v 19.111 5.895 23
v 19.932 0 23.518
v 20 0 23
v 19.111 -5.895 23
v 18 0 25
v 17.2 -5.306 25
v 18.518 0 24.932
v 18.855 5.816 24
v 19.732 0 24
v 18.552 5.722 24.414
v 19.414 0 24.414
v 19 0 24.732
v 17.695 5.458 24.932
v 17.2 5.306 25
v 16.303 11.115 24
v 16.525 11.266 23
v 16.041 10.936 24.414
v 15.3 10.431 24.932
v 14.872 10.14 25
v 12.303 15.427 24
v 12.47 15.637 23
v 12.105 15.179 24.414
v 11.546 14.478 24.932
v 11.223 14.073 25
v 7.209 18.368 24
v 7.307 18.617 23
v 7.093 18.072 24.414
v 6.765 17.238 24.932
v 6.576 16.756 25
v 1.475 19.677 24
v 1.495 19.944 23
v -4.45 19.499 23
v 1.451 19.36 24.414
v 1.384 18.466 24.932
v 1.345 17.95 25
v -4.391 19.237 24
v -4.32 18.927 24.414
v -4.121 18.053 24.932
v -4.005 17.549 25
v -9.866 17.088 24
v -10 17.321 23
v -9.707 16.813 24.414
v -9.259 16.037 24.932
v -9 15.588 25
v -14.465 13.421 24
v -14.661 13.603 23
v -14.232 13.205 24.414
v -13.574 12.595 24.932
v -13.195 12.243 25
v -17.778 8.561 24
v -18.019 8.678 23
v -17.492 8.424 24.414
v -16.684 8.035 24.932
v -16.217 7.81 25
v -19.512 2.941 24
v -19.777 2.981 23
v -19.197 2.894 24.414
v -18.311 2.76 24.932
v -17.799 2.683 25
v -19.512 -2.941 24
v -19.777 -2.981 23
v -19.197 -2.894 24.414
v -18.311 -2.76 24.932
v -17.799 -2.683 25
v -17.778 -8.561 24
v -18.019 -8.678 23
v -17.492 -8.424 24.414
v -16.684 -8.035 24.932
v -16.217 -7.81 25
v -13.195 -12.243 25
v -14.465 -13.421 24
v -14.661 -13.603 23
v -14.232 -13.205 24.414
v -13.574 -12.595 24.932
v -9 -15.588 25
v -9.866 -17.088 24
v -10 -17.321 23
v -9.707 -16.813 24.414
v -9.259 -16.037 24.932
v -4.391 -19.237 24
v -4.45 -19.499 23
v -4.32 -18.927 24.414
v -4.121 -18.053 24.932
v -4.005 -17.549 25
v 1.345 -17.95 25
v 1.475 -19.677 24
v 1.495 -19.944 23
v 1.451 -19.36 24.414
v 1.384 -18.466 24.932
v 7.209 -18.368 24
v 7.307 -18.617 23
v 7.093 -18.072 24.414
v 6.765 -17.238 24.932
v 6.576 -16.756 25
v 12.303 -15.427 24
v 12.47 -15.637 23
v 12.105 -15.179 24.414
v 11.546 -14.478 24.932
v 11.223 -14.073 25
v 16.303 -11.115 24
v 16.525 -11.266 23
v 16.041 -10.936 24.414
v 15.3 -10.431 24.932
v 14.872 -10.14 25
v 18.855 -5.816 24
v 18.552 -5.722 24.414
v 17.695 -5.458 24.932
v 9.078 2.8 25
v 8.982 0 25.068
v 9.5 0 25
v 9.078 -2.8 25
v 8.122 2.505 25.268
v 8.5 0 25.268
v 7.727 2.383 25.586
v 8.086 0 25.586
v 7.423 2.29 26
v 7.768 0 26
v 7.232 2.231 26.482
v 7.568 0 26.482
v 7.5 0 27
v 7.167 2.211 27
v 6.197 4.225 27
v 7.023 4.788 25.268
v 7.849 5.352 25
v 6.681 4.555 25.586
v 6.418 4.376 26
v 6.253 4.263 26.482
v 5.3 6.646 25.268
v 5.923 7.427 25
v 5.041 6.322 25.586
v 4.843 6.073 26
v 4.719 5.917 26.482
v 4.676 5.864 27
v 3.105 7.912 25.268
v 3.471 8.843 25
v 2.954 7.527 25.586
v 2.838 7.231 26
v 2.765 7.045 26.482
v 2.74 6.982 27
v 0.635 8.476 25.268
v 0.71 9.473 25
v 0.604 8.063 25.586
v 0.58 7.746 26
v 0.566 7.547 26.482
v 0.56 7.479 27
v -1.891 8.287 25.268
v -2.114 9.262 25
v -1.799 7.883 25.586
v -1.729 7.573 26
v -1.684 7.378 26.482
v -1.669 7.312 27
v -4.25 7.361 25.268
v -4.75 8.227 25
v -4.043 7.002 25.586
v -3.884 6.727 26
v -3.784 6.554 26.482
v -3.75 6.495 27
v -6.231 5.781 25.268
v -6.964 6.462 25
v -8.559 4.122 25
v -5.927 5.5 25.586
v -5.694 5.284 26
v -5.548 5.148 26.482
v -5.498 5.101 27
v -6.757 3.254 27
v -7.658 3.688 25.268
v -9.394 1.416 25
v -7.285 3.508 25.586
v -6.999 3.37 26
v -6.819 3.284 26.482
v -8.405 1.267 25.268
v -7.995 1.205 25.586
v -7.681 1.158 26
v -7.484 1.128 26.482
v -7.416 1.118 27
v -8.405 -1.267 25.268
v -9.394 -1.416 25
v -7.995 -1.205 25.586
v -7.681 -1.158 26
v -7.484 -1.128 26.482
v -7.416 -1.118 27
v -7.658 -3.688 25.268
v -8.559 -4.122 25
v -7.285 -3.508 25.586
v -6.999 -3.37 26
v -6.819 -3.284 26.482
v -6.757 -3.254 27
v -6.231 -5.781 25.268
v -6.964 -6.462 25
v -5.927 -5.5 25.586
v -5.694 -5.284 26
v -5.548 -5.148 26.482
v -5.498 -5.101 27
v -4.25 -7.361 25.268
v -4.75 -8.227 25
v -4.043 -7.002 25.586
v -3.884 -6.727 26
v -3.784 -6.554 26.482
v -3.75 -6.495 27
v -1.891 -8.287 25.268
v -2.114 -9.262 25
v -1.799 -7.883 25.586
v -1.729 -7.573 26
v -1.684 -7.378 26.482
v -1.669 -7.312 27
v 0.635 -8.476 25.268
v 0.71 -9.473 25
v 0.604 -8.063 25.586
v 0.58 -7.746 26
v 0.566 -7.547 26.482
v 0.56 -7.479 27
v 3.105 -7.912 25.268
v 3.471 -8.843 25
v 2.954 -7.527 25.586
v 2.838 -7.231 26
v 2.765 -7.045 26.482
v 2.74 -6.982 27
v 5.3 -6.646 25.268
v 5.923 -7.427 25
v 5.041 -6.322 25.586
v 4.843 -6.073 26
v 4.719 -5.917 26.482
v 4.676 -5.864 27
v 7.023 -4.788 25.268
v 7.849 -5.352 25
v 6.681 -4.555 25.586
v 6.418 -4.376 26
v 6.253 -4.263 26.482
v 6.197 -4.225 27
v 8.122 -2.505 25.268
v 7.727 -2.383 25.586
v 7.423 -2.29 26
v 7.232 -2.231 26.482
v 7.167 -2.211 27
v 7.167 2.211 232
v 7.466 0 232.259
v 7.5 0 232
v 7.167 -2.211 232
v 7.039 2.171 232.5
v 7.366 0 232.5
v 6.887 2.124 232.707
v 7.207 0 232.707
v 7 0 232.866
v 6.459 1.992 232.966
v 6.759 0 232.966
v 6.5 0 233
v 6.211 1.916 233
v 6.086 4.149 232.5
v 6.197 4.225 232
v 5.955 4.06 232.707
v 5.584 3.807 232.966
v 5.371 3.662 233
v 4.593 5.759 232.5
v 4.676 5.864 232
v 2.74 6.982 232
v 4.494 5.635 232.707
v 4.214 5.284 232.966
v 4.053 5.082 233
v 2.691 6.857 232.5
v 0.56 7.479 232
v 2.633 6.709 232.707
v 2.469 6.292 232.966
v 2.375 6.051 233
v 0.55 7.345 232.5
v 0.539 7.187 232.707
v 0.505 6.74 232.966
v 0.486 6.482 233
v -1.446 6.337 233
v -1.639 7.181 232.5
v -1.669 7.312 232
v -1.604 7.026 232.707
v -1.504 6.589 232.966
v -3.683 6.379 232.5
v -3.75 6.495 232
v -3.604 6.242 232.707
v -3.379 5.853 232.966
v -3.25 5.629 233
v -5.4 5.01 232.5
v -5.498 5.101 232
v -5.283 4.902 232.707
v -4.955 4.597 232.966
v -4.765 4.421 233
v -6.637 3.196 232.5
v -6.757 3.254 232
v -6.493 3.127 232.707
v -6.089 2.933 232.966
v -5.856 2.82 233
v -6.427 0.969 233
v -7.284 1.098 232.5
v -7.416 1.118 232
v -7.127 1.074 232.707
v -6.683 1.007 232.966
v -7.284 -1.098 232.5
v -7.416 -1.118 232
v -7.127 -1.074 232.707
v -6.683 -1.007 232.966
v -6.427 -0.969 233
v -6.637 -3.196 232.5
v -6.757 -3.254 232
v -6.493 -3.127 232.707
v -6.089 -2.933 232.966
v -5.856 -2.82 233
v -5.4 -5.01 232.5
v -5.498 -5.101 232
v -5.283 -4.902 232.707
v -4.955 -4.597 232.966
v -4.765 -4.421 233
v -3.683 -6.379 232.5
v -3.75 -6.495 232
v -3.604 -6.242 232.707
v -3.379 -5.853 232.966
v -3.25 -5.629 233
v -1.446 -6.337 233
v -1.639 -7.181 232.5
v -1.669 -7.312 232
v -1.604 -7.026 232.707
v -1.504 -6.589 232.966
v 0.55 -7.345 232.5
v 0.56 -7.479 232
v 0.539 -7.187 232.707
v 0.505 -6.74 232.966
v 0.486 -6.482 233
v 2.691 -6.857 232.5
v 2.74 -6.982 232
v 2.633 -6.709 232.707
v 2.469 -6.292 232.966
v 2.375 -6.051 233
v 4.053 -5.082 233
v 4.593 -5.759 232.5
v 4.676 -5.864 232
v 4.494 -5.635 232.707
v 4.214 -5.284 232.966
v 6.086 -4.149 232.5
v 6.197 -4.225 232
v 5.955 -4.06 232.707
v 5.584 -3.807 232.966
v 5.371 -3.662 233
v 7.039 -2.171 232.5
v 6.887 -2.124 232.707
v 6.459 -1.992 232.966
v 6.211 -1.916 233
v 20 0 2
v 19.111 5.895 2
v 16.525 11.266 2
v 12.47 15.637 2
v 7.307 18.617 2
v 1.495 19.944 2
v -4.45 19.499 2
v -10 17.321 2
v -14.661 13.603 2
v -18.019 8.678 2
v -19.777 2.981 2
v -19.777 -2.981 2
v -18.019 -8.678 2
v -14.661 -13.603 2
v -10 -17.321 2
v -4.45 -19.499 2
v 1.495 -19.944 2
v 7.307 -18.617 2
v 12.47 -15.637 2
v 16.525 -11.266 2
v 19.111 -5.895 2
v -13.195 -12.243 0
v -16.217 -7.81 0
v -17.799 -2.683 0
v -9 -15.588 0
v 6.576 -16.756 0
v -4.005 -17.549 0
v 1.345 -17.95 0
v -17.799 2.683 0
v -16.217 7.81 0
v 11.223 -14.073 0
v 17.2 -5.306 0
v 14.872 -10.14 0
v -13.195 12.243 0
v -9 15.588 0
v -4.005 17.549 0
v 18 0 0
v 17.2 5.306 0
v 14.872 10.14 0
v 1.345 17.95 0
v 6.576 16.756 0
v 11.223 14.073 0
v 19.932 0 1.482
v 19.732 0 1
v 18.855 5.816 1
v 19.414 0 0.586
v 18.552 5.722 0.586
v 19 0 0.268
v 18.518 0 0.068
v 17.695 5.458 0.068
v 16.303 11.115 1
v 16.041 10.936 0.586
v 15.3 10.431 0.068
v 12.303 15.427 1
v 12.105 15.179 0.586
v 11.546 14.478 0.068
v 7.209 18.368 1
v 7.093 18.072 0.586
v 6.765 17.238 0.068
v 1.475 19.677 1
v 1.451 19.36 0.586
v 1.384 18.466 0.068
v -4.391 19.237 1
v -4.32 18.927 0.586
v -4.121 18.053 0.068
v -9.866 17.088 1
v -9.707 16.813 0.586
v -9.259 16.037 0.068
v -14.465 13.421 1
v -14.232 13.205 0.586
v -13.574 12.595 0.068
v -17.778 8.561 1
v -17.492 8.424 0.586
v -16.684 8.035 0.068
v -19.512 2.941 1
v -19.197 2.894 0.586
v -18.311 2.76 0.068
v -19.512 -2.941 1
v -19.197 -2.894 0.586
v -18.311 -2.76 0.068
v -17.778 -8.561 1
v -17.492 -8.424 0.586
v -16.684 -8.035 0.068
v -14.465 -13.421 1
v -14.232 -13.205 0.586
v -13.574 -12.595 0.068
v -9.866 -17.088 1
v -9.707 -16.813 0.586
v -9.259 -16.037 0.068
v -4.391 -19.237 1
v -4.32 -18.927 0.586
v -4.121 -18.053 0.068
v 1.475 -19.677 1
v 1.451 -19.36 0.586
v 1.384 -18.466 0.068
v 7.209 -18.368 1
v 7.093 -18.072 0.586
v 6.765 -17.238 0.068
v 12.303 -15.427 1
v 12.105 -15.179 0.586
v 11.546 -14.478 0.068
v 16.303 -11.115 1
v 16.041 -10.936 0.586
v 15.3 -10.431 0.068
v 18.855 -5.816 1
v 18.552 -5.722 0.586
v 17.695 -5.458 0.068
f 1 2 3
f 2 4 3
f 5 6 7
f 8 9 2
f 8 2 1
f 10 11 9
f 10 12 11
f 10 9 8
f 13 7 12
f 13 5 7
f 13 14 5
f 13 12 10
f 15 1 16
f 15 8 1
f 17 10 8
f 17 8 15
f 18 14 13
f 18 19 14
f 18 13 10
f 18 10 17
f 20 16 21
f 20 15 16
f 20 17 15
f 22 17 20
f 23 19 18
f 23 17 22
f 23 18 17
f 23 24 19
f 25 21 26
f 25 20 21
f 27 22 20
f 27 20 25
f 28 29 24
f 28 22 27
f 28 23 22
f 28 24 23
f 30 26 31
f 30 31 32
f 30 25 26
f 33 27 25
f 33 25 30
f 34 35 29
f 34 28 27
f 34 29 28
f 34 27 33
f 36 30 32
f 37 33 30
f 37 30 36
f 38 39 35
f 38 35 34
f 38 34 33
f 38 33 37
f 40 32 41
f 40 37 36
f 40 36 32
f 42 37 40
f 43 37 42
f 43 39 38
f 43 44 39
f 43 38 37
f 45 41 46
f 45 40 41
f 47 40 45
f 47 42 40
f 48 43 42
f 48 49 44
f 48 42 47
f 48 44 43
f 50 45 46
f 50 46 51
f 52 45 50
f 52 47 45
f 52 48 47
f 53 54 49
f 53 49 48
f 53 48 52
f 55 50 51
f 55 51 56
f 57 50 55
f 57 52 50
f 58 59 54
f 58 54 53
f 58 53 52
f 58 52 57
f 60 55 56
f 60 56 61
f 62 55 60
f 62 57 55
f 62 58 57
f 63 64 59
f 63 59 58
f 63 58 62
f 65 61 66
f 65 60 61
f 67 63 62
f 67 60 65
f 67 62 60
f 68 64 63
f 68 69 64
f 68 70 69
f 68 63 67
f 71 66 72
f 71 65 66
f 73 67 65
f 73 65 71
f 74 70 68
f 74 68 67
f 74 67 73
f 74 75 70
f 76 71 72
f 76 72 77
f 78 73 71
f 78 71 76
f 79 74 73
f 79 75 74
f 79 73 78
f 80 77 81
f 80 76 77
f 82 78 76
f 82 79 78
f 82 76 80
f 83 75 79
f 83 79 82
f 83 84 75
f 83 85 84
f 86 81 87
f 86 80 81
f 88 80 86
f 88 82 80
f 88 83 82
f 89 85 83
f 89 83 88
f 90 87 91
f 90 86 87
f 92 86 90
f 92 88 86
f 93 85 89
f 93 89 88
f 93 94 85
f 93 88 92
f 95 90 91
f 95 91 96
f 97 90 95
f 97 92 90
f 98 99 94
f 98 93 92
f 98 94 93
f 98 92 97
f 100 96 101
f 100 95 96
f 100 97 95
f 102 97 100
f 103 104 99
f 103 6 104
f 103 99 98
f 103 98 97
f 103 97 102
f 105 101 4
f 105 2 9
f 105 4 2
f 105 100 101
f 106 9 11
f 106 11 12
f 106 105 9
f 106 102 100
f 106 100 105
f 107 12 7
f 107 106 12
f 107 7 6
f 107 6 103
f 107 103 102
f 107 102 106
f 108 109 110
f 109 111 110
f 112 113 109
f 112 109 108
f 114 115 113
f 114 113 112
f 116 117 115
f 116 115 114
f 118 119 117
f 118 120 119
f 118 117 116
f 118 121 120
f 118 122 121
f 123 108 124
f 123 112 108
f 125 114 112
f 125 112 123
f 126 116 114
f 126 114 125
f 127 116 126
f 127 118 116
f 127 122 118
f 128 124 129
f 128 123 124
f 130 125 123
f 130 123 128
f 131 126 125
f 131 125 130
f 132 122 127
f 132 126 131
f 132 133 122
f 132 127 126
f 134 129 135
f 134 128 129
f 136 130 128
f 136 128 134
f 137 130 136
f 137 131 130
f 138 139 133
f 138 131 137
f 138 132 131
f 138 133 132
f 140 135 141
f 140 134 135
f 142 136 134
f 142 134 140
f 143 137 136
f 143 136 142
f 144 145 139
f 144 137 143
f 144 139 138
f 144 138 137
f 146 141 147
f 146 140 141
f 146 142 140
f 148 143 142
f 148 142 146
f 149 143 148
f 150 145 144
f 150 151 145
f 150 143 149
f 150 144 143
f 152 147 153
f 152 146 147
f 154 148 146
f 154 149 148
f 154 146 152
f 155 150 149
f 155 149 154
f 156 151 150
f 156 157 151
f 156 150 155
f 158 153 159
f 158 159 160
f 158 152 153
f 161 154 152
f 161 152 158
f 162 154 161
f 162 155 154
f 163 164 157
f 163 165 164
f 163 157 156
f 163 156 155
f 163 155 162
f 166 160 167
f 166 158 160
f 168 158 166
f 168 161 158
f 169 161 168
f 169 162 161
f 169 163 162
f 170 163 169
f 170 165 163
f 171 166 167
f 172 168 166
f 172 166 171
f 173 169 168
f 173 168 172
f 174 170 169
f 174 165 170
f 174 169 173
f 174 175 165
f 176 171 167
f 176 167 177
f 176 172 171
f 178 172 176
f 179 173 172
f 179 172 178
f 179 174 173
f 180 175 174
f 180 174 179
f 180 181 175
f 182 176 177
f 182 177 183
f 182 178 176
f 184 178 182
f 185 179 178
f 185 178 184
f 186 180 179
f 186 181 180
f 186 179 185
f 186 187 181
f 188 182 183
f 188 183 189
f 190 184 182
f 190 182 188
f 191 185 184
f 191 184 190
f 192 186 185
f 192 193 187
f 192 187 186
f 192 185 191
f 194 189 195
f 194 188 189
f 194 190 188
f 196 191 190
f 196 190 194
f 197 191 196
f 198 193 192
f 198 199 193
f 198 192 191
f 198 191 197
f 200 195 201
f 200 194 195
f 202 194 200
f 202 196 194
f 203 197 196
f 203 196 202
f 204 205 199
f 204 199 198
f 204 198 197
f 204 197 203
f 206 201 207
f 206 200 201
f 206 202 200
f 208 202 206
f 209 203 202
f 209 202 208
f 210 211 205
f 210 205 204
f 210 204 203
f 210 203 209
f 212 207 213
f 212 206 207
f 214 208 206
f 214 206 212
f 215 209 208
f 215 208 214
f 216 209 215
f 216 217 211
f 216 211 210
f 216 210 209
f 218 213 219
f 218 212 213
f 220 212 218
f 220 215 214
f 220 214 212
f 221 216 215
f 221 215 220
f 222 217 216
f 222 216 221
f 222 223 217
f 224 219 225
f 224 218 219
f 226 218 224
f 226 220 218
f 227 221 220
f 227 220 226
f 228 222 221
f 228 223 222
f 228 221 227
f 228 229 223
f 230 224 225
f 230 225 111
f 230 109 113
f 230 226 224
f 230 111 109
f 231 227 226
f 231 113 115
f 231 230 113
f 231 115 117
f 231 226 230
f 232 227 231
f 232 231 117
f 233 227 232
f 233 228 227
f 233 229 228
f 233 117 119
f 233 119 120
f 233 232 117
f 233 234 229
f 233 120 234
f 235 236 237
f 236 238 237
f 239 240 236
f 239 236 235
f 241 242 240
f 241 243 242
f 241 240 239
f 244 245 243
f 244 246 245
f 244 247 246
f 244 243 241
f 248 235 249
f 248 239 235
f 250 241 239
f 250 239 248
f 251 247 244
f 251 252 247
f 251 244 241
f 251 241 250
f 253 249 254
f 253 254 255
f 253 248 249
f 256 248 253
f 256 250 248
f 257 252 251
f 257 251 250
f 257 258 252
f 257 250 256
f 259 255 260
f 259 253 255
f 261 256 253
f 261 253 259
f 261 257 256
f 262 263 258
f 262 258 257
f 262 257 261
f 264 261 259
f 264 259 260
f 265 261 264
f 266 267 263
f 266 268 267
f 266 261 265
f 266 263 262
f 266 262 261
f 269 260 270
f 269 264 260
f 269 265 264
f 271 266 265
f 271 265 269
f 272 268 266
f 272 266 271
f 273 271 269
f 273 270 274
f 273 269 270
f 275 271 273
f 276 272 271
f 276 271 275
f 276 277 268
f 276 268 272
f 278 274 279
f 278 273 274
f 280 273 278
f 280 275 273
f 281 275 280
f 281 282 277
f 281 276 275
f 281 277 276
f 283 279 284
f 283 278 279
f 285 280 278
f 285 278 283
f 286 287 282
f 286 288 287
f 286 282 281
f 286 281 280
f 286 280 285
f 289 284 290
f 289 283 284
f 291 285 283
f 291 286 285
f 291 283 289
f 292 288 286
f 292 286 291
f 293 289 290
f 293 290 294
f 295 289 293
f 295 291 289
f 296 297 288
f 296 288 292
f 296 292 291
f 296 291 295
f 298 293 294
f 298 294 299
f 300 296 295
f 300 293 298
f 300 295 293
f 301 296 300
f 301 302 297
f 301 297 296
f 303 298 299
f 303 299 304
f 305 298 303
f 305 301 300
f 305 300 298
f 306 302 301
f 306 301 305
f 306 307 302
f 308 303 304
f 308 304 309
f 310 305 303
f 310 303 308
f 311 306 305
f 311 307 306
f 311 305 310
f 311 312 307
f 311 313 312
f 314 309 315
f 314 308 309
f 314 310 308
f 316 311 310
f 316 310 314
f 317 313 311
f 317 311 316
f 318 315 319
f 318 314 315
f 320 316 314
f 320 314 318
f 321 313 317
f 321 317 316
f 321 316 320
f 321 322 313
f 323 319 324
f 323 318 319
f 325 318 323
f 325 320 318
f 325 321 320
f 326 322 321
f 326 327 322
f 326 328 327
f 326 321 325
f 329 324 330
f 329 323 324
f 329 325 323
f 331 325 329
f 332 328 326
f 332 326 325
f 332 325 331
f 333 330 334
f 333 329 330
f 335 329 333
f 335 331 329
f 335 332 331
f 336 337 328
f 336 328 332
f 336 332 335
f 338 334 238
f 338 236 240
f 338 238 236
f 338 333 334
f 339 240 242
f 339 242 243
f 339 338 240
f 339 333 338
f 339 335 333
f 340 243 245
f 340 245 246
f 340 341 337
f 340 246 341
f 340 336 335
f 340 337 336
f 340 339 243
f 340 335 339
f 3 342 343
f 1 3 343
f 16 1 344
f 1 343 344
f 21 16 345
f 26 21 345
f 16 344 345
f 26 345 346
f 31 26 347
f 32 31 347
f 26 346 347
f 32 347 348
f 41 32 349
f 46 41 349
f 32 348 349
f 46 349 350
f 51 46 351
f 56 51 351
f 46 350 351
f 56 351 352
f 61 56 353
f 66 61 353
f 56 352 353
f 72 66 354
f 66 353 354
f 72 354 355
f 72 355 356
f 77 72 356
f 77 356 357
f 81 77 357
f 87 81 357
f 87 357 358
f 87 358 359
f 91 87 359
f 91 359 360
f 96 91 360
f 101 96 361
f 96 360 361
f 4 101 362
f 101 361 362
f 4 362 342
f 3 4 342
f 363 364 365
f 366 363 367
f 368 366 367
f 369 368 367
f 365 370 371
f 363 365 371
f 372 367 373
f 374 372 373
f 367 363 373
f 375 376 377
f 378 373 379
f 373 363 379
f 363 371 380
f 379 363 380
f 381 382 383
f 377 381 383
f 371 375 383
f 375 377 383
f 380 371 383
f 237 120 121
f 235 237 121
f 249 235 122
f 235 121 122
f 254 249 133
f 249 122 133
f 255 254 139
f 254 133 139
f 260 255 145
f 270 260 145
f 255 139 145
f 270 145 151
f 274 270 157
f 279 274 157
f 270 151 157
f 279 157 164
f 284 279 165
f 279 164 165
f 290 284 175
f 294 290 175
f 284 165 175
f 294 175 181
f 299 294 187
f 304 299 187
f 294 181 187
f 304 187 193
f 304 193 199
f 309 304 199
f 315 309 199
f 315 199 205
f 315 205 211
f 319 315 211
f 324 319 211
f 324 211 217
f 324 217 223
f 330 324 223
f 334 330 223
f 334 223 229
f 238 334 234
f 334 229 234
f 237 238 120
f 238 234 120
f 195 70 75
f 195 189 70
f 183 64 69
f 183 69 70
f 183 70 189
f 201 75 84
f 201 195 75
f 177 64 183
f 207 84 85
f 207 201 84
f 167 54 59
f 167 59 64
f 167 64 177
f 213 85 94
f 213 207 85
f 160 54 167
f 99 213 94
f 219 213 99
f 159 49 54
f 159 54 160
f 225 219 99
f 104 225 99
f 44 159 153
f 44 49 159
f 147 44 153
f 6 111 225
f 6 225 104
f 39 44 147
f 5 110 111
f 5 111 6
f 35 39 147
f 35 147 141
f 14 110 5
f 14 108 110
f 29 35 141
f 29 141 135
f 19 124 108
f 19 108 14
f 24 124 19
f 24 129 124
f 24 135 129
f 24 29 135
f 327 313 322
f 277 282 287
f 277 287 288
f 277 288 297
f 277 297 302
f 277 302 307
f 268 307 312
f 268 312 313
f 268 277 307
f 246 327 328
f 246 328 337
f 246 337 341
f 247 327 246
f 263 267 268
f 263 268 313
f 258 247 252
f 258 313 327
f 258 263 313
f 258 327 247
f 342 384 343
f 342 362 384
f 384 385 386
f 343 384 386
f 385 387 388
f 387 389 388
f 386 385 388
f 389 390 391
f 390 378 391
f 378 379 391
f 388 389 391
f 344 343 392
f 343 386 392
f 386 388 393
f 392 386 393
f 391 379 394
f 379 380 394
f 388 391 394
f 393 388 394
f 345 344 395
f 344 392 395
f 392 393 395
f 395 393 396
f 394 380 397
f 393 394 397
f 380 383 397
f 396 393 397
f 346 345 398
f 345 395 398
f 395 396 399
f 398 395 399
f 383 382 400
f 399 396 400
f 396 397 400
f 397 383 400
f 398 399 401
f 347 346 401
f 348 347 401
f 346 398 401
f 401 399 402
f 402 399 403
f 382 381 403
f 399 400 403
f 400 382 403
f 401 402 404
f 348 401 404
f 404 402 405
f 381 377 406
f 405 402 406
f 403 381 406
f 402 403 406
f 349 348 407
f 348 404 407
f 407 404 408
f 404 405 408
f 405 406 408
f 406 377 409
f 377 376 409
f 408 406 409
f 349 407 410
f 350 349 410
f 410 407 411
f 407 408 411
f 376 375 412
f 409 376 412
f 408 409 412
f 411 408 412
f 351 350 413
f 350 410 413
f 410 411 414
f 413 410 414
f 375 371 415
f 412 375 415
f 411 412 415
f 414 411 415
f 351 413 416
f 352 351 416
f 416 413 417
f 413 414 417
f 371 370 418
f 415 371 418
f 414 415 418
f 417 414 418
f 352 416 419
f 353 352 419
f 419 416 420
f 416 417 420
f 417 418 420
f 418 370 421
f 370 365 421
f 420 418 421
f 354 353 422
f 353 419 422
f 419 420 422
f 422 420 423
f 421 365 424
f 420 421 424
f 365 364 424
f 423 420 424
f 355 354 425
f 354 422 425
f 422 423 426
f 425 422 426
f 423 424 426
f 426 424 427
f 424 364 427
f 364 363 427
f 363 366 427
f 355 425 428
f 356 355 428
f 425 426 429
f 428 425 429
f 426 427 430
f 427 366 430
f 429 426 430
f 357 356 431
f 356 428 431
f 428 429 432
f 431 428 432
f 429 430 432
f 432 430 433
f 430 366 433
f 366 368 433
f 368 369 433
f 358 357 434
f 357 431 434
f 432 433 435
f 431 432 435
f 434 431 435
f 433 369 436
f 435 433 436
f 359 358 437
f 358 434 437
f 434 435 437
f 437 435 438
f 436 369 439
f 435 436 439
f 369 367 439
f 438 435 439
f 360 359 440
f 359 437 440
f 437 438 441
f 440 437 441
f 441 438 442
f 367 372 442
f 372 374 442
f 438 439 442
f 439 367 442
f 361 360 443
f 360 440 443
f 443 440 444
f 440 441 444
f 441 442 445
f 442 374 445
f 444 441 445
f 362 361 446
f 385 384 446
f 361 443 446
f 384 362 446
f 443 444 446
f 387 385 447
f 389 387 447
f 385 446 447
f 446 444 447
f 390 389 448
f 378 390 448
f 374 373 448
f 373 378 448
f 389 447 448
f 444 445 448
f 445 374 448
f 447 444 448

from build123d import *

# Parameters (mm, degrees)
F0_R     = 20
F1_DEPTH = 25
F2_R     = 7.5
F3_DEPTH = 208
F4_R     = 2
F5_R     = 1


with BuildPart() as f1:
    # F0 (on Top) → F1 (new body)
    with BuildSketch(Plane.XY):
        Circle(F0_R)
    extrude(amount=F1_DEPTH)

    # F2 (on face) → F3 (join)
    with BuildSketch(Plane.XY.offset(25)):
        Circle(F2_R)
    extrude(amount=F3_DEPTH)

    # F4
    f4_edges = [f1.edges().sort_by_distance(p)[0] for p in [
        (-20, 0, 0),
        (-20, 0, 25),
        (-7.5, 0, 25),
    ]]
    fillet(f4_edges, radius=F4_R)

    # F5
    f5_edges = [f1.edges().sort_by_distance(p)[0] for p in [
        (-7.5, 0, 233),
    ]]
    fillet(f5_edges, radius=F5_R)


solid = f1.part
